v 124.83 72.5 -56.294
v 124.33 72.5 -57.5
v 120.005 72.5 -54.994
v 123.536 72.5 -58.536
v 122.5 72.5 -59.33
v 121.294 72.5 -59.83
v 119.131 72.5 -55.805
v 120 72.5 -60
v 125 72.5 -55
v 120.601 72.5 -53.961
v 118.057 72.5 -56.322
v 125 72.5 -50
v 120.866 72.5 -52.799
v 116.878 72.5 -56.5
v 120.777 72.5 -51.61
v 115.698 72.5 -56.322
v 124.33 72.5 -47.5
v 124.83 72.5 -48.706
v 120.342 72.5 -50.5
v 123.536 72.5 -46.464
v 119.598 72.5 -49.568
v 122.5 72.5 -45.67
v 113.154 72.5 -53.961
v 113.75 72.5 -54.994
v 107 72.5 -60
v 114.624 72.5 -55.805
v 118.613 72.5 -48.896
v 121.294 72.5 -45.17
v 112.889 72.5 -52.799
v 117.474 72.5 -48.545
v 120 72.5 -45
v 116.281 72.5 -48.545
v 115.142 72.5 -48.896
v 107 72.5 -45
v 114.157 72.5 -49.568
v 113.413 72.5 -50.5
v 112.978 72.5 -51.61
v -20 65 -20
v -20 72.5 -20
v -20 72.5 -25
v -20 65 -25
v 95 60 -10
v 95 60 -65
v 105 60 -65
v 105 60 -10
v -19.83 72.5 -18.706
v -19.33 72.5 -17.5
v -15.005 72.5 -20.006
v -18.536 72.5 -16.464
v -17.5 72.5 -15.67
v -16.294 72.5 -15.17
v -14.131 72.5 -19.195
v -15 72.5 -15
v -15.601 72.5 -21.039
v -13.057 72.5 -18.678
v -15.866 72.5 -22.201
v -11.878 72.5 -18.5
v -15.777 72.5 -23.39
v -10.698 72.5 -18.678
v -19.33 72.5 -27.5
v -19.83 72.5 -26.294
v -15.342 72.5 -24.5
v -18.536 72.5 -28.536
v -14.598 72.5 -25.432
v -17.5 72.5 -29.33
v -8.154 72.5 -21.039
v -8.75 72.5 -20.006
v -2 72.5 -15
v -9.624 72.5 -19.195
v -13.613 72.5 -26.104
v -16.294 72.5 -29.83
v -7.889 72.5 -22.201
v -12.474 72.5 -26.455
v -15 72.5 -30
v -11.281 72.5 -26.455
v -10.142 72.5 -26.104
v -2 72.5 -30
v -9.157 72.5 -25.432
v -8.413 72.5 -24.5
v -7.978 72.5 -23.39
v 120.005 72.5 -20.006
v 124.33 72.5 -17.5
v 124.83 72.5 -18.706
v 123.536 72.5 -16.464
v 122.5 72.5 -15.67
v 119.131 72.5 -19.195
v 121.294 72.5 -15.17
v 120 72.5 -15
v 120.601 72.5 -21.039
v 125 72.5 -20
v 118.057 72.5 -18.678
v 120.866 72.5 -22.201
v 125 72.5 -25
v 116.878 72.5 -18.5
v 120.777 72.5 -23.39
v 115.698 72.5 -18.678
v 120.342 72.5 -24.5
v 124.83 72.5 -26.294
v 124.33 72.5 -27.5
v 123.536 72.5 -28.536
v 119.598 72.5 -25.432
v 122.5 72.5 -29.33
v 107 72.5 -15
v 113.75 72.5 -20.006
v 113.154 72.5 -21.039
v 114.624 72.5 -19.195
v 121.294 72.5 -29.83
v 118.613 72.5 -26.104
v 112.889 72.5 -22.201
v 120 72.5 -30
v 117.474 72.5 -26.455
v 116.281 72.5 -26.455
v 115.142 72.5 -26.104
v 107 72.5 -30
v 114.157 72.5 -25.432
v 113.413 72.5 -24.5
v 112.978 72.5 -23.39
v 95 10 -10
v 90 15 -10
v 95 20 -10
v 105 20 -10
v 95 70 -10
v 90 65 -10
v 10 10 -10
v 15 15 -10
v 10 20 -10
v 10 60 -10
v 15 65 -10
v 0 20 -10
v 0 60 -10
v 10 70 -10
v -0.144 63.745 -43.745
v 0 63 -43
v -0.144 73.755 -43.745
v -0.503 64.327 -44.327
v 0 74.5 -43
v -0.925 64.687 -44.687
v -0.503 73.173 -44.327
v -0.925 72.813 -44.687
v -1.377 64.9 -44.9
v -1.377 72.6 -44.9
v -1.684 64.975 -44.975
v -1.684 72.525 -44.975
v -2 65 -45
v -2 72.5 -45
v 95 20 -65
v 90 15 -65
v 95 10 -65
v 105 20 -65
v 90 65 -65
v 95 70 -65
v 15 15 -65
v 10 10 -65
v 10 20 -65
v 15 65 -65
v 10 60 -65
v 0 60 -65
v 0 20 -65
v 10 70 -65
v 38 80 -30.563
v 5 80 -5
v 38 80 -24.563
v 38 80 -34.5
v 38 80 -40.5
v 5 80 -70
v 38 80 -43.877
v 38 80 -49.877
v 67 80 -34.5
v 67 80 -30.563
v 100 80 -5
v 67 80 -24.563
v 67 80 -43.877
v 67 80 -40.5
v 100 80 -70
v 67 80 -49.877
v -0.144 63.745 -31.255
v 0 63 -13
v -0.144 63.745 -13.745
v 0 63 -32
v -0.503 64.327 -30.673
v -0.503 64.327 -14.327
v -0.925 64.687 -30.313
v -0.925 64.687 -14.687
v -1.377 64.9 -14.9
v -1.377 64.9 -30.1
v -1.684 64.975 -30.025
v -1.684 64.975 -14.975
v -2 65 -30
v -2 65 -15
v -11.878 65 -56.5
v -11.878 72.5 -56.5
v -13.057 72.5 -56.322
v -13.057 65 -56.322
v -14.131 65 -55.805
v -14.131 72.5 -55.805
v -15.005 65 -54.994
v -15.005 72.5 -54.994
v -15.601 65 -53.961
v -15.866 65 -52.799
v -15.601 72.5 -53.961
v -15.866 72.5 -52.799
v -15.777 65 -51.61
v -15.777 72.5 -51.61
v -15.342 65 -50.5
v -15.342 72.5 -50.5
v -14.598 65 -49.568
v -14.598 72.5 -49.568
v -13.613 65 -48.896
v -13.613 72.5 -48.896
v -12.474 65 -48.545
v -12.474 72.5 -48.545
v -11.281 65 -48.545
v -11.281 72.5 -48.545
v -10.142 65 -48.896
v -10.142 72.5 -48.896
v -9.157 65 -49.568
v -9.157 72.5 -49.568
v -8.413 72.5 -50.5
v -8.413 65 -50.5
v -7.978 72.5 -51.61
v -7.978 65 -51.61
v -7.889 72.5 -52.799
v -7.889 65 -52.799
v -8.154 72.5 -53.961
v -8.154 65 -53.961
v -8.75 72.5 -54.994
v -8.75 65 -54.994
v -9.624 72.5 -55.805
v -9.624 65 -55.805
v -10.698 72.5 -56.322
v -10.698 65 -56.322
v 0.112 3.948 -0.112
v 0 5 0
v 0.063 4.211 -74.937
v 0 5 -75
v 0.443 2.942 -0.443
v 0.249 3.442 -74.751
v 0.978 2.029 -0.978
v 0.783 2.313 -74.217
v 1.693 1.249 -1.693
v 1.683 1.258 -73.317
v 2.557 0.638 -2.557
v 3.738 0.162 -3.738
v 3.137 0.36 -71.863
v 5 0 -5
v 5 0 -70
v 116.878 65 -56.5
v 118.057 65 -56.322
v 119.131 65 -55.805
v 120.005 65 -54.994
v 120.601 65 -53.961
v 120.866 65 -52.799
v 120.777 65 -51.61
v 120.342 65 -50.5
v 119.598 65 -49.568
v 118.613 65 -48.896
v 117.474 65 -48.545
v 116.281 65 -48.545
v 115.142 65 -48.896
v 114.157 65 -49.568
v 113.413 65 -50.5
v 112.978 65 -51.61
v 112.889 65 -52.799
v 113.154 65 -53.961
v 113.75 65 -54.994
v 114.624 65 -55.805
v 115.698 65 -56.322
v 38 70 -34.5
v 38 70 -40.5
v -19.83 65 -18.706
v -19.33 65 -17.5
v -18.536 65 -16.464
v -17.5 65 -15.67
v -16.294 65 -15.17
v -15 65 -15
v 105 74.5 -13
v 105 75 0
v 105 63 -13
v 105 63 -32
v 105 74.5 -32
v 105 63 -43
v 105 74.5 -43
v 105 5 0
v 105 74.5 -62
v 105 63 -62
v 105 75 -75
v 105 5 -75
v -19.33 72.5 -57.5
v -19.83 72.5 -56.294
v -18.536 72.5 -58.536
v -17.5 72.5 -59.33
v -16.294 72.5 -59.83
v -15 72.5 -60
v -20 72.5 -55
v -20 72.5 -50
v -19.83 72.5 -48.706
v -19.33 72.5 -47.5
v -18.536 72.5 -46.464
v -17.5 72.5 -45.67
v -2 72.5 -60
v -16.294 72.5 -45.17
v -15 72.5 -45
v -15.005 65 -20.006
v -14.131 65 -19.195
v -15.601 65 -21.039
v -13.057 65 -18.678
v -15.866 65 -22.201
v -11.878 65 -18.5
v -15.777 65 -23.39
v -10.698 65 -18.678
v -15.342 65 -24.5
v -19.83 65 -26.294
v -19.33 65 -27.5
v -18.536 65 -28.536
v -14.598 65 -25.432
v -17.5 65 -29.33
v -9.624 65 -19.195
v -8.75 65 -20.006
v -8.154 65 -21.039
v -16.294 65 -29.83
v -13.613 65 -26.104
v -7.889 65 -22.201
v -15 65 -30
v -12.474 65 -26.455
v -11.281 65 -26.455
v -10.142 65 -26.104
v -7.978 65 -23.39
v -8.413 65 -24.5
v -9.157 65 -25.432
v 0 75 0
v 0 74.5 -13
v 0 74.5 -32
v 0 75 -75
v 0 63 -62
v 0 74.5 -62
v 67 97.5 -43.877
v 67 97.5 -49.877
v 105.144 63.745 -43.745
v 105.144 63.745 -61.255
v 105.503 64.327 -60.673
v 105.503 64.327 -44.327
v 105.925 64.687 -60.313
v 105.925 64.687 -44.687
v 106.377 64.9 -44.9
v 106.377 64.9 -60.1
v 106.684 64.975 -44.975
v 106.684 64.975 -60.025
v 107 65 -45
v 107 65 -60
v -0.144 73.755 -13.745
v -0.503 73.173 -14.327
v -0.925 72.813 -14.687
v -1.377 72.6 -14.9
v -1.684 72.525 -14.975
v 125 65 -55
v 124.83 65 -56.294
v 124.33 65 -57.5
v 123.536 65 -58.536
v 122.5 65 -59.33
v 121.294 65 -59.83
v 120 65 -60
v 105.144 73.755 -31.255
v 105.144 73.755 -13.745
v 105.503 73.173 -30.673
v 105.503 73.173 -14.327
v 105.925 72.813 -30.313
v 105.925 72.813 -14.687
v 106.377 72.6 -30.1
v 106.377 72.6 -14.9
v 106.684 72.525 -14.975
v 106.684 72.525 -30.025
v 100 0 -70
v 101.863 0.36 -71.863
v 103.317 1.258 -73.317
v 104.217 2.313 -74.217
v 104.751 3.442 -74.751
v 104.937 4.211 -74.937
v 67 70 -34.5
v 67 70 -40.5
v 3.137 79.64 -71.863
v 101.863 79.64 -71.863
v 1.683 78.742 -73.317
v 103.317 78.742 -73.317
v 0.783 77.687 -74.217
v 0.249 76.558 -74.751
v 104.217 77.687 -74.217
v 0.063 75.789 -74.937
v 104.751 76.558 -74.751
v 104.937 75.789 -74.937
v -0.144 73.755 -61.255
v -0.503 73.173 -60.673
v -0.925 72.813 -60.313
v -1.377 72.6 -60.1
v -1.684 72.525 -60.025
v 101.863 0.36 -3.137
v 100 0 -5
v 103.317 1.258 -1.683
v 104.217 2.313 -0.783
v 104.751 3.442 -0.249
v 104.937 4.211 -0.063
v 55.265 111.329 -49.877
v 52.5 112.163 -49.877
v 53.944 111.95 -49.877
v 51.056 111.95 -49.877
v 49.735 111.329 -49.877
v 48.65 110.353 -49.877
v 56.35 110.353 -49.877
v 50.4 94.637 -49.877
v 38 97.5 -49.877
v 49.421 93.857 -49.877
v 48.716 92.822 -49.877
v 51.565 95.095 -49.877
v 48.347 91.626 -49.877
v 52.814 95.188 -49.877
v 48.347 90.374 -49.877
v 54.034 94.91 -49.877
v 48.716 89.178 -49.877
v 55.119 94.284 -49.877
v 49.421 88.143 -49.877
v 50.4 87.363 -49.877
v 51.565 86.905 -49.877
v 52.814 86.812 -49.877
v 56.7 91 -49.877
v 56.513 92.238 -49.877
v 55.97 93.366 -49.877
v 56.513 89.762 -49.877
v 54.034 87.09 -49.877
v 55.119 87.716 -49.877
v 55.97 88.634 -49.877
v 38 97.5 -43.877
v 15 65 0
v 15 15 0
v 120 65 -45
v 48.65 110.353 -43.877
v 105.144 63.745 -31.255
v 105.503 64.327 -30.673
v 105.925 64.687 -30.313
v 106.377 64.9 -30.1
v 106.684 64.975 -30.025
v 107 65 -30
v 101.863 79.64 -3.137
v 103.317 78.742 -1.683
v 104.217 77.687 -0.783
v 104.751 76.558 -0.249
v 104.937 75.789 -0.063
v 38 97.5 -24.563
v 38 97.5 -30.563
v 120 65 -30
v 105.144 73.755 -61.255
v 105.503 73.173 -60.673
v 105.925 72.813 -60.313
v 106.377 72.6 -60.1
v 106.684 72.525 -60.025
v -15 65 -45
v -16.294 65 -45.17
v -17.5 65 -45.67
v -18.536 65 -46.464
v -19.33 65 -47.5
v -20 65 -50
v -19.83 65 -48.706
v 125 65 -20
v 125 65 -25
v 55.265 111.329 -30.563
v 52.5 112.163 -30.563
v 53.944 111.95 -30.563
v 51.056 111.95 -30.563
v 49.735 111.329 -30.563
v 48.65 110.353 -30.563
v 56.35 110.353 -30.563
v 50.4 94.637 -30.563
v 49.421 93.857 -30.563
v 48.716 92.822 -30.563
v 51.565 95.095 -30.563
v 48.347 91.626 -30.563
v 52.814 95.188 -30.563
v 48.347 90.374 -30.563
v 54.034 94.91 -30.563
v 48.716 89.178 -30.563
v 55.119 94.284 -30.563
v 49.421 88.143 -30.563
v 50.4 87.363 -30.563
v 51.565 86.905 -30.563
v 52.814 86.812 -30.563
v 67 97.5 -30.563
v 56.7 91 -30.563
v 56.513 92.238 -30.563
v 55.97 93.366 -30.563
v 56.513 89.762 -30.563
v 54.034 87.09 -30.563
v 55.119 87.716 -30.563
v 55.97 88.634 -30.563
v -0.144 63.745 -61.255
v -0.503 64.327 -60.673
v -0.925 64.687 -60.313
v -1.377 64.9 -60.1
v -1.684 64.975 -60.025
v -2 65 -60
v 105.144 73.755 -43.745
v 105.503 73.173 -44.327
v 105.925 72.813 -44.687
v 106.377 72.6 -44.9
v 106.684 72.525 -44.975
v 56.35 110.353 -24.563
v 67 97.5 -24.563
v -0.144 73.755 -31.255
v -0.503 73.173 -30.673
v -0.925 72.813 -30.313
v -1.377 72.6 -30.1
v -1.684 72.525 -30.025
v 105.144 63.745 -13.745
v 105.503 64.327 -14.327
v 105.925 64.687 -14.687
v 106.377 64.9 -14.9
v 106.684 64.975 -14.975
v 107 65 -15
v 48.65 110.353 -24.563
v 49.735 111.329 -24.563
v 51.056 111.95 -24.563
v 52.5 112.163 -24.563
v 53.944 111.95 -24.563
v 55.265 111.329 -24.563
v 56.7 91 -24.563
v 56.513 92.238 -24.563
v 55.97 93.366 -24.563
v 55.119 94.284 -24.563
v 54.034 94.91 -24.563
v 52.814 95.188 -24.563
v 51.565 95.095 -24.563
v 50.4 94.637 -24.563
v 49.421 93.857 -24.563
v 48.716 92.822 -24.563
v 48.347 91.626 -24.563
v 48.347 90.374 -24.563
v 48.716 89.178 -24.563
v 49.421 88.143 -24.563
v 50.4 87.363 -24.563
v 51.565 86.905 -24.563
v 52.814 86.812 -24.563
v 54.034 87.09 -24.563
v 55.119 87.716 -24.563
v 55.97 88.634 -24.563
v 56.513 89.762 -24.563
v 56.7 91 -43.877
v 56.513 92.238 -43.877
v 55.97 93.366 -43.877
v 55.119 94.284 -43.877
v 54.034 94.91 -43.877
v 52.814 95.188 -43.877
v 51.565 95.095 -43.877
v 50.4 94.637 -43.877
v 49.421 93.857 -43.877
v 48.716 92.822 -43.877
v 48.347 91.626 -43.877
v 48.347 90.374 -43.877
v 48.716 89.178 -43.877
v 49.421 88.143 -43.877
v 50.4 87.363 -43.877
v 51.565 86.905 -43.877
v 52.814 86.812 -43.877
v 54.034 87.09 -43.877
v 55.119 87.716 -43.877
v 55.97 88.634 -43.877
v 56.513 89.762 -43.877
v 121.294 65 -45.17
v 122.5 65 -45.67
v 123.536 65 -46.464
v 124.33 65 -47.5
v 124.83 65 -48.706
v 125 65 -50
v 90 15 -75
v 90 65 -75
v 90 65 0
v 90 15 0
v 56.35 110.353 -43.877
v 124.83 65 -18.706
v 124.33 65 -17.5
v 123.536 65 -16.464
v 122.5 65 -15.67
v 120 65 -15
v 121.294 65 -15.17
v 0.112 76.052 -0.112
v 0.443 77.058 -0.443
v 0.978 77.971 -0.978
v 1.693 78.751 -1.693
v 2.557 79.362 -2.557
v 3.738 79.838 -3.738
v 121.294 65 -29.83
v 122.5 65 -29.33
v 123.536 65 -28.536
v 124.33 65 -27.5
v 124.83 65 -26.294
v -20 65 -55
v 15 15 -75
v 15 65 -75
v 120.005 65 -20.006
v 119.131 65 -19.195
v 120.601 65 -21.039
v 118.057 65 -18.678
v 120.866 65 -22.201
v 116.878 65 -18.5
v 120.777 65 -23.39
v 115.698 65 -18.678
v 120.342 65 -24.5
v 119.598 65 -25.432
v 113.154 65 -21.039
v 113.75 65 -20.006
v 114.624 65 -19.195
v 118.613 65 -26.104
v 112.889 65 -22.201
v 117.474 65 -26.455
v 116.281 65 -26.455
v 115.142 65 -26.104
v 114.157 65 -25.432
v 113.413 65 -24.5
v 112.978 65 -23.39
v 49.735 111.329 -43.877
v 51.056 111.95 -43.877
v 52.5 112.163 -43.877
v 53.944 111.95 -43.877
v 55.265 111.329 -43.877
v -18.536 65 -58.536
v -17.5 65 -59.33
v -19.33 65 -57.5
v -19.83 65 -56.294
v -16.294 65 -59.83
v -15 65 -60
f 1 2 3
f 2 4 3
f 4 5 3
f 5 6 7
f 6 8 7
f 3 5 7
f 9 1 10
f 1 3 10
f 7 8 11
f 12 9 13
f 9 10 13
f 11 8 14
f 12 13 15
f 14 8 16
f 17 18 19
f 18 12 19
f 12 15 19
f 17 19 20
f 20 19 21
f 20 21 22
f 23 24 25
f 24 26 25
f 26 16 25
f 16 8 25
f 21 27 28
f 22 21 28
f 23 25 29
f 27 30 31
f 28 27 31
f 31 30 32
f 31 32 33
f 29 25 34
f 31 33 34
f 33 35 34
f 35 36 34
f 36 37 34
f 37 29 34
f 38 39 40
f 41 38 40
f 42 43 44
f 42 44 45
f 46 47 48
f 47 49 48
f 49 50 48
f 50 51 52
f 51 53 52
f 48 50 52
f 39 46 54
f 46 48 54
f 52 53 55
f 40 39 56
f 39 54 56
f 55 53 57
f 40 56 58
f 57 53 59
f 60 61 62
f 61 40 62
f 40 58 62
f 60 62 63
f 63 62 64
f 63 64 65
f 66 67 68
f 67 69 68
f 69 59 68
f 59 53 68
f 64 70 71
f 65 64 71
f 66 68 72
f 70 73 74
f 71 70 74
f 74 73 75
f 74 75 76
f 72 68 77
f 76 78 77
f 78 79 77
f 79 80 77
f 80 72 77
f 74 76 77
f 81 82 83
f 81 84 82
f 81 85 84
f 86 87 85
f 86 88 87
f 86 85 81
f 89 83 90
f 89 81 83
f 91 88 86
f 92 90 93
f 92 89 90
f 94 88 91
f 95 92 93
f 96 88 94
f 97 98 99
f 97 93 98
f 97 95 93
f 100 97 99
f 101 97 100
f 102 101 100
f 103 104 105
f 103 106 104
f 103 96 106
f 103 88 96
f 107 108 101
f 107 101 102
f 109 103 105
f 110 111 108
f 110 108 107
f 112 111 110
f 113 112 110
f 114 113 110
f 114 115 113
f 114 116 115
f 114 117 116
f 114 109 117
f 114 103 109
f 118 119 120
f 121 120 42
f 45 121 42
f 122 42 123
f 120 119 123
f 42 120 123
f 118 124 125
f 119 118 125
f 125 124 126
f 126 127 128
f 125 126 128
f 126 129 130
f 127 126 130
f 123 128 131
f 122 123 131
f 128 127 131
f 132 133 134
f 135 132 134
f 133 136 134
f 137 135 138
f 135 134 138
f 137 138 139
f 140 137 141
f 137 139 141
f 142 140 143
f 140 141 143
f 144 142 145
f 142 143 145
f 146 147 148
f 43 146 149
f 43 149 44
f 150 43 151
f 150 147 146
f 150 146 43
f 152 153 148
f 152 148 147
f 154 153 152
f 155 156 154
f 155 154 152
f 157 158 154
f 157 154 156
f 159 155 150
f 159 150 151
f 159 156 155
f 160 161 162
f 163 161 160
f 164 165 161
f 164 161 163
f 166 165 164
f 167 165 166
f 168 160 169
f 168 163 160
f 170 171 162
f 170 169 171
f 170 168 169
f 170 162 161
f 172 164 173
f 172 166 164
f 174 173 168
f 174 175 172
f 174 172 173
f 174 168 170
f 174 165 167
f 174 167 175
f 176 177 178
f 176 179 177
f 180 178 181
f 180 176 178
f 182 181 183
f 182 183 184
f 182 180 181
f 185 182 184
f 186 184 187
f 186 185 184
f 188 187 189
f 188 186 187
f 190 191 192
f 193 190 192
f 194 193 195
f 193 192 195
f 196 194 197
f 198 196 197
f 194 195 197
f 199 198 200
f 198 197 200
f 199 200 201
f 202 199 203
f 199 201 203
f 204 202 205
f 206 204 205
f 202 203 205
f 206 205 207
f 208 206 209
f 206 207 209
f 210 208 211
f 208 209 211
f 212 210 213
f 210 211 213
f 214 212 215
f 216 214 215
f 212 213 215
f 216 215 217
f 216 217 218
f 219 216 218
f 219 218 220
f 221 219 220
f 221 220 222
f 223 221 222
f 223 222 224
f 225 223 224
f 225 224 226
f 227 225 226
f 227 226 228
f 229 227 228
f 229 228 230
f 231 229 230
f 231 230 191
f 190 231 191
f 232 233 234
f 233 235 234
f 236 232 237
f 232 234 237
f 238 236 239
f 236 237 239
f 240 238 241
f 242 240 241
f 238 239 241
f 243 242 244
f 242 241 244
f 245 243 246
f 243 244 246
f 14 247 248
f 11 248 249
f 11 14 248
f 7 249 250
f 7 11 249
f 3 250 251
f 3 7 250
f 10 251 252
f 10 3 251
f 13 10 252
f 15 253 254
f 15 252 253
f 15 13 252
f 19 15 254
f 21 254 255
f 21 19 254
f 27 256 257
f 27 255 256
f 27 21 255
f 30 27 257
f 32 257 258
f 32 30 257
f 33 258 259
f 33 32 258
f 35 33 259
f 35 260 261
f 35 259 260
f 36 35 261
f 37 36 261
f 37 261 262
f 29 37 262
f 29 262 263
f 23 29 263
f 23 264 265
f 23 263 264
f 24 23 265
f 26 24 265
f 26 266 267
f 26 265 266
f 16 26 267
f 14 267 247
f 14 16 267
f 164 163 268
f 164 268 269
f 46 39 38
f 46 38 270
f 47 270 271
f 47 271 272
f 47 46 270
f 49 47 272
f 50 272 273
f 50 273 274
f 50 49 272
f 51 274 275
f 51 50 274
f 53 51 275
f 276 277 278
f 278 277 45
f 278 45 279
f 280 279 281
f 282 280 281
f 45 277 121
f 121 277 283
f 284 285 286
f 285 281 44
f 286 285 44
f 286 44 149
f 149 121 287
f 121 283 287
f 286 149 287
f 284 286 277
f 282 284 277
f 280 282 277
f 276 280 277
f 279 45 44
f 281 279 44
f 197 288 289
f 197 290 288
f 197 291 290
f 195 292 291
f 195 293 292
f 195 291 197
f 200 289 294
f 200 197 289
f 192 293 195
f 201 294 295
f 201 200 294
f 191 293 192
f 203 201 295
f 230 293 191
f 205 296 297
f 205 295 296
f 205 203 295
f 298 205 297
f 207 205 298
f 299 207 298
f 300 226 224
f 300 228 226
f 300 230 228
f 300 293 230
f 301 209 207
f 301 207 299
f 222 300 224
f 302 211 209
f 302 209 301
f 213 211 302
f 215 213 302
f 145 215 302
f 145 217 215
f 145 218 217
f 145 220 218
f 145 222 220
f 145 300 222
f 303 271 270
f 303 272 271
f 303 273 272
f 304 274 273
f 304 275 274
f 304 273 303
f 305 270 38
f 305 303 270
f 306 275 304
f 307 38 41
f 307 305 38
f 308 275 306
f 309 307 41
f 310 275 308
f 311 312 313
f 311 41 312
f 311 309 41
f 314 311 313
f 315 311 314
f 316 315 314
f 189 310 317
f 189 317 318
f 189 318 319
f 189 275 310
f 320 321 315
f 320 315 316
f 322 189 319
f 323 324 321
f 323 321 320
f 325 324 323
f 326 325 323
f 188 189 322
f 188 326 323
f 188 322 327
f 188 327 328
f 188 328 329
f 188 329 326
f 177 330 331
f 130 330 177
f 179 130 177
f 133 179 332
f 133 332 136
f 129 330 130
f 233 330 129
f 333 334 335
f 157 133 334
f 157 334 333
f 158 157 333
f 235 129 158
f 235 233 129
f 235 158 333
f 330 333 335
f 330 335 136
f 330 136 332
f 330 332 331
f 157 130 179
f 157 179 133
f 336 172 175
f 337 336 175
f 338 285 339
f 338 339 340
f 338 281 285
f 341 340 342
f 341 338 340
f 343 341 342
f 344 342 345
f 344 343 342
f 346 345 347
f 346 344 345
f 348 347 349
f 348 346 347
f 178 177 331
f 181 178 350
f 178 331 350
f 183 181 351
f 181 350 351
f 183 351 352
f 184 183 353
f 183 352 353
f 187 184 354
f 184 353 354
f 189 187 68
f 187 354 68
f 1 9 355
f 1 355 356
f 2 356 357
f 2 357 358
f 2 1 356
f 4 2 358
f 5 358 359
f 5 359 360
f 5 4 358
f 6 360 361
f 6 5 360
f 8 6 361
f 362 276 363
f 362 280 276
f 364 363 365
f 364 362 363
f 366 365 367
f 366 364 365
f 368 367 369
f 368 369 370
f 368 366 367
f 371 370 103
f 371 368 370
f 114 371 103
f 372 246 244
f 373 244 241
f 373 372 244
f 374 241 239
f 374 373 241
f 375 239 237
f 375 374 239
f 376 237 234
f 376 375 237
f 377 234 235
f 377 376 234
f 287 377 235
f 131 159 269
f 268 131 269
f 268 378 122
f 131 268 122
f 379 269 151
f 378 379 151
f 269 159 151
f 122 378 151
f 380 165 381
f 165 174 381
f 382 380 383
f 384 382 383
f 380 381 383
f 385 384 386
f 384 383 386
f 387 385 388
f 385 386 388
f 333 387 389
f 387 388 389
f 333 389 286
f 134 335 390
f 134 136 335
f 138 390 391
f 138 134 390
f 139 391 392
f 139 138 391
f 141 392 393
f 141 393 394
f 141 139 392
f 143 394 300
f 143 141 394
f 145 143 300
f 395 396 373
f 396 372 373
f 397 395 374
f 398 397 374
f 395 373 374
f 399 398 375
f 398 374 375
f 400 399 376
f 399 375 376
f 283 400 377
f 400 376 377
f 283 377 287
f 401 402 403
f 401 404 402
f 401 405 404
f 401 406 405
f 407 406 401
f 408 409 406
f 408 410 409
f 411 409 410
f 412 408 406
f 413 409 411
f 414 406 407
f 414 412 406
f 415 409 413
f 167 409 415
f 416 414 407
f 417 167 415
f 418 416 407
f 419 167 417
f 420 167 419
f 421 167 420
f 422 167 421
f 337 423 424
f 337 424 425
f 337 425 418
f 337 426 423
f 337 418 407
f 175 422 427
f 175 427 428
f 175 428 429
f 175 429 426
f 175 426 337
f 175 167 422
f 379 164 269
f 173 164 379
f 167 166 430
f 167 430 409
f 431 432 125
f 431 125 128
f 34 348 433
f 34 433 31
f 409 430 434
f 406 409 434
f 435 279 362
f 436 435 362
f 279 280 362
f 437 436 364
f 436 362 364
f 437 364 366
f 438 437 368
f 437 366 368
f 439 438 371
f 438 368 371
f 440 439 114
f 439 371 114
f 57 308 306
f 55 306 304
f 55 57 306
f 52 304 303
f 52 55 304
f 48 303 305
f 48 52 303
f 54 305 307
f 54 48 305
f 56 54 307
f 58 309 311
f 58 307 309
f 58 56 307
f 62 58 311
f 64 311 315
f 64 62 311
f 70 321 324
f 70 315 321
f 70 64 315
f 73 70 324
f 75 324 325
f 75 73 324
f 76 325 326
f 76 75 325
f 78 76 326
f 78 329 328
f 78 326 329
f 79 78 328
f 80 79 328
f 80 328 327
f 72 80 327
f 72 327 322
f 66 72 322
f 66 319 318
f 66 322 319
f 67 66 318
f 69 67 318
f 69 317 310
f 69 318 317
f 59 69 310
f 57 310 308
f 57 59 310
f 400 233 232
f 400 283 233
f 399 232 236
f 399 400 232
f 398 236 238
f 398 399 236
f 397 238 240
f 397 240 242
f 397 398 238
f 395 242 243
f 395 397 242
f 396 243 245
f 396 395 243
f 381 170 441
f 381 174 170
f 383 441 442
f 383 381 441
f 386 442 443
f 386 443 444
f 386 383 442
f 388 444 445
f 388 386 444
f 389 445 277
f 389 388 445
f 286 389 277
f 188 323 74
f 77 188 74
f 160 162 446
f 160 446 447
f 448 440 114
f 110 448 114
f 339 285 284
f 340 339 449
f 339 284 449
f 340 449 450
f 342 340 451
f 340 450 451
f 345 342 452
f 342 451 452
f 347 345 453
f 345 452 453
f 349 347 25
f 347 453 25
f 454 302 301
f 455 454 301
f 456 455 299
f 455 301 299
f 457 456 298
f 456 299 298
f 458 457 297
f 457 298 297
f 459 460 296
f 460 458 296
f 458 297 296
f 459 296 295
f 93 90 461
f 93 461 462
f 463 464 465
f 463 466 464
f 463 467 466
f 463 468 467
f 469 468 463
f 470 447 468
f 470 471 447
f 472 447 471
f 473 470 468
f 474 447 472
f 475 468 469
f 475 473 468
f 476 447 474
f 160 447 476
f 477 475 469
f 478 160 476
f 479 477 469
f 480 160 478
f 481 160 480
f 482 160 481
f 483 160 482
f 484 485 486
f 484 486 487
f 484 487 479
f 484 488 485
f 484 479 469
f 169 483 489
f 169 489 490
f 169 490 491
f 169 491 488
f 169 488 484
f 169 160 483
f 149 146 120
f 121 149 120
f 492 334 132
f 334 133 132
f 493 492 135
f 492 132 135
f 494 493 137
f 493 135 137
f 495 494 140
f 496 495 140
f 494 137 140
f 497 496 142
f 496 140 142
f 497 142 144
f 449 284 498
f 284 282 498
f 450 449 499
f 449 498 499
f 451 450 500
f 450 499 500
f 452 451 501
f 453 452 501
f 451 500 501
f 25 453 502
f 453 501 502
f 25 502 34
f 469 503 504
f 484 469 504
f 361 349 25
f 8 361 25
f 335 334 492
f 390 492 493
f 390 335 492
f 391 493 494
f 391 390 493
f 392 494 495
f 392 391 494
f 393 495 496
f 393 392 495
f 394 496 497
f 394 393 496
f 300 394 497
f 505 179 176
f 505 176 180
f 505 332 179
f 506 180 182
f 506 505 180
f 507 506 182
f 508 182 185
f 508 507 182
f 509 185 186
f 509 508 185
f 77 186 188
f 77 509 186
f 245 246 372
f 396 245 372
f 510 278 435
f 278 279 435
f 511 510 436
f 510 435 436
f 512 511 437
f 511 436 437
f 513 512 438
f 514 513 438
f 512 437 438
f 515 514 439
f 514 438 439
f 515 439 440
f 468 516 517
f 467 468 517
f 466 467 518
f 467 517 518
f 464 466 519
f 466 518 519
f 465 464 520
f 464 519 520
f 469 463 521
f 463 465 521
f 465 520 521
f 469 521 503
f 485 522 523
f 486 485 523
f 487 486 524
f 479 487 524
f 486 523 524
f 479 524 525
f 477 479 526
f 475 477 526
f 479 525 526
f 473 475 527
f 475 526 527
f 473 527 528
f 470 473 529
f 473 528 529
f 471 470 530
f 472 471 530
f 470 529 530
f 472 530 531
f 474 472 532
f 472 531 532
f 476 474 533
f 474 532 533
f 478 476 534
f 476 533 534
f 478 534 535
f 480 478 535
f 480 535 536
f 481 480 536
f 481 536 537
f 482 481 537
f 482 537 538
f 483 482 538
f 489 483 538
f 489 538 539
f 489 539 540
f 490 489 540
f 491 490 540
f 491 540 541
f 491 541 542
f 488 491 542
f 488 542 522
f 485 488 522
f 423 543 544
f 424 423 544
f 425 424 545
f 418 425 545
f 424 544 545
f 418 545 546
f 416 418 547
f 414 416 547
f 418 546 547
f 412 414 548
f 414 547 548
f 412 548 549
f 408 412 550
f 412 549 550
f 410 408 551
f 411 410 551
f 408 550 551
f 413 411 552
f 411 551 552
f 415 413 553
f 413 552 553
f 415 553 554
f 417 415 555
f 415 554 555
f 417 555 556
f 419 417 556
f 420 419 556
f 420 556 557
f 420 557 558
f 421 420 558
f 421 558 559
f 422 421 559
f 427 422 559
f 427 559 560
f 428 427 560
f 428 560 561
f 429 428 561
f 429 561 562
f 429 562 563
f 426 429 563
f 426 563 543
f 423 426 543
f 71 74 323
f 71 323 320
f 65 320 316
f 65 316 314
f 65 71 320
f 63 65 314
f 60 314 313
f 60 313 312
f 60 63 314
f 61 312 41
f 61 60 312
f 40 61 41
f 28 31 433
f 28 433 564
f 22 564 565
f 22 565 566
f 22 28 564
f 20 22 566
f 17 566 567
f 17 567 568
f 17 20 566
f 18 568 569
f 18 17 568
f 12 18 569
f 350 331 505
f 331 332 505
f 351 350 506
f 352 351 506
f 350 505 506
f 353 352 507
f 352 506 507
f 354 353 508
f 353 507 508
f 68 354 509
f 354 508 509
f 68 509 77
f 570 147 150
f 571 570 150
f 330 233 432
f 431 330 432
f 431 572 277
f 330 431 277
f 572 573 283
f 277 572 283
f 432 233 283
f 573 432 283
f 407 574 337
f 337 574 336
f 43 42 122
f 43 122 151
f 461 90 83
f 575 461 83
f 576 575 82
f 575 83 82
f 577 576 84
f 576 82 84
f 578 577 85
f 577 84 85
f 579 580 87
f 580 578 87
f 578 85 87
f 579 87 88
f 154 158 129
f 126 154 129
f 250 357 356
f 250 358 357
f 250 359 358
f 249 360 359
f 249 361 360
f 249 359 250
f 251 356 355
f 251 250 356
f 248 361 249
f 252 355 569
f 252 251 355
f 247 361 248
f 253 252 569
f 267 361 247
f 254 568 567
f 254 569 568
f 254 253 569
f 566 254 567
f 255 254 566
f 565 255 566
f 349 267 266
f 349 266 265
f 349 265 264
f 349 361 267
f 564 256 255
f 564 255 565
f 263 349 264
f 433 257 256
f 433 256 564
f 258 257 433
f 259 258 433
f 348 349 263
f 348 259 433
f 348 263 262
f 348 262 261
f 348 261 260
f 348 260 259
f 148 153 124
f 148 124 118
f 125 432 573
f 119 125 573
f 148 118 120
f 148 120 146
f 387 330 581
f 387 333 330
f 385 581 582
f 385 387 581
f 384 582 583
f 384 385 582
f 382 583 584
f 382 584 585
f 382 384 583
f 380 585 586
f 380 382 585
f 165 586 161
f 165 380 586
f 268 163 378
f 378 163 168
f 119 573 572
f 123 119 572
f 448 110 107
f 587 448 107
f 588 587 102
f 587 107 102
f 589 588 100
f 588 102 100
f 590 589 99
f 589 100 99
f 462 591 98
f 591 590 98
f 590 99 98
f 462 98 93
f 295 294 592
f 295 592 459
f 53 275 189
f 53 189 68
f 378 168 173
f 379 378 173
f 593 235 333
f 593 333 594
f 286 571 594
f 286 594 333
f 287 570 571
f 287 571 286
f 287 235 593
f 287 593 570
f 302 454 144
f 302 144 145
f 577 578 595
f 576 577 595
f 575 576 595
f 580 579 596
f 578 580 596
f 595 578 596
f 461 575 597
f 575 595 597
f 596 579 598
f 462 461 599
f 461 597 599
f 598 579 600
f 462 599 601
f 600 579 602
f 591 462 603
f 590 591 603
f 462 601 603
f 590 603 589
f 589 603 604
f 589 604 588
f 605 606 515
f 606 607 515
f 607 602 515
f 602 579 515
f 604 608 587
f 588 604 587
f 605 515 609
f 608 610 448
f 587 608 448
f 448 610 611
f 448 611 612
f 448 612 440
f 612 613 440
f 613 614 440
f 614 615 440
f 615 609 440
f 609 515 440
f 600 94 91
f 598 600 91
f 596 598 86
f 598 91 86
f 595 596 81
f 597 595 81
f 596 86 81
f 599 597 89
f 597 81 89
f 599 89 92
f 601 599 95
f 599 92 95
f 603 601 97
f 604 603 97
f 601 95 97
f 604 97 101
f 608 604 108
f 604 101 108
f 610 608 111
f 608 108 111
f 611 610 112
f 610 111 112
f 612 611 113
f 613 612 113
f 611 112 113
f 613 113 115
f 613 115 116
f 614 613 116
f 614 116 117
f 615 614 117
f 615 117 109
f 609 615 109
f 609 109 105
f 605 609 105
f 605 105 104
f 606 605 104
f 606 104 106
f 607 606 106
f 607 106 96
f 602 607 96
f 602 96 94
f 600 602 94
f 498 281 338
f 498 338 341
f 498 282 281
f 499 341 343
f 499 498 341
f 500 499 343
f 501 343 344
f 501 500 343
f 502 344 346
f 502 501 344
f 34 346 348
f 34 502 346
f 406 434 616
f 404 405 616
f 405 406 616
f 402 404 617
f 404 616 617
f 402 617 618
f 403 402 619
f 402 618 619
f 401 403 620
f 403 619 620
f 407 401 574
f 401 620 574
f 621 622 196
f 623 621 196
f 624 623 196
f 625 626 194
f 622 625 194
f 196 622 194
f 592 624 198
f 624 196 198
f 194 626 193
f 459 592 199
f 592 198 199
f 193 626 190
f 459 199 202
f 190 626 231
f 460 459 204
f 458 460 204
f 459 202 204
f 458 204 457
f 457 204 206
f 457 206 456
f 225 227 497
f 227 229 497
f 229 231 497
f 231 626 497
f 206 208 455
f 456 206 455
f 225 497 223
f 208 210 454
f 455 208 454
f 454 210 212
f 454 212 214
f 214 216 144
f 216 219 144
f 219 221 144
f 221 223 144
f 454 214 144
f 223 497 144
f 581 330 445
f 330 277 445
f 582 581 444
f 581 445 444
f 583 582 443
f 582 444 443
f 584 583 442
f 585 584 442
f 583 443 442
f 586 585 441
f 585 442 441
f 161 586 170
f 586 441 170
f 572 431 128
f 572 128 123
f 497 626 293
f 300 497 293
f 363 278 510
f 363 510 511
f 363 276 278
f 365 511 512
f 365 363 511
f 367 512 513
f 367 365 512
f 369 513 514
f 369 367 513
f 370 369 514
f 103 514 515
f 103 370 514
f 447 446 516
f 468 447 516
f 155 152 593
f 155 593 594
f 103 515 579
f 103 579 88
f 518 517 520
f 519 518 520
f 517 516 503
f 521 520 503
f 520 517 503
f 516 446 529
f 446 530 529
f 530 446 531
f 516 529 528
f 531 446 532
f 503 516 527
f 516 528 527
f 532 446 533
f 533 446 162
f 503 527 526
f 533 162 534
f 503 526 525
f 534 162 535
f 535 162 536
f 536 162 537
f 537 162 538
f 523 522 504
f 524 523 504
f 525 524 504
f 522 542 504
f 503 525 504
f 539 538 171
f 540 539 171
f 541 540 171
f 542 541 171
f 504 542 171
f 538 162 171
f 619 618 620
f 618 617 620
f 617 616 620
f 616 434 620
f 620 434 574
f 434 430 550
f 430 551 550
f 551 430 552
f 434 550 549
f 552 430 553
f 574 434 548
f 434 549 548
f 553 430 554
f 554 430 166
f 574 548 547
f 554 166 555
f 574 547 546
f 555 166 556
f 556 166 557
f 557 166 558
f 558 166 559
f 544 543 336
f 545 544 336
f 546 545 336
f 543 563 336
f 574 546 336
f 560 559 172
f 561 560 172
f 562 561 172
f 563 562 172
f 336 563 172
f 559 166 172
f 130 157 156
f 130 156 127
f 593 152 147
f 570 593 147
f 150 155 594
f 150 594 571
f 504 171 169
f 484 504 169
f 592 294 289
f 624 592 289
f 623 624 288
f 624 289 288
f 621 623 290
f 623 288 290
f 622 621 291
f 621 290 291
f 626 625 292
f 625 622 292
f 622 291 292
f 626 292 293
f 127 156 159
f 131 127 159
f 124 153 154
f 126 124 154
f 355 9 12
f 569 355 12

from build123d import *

# Parameters (mm, degrees)
SKETCH1_W               = 105
SKETCH1_H               = 75
BOSS_EXTRUDE1_DEPTH     = 80
SHELL1_T                = -10
SKETCH2_W               = 10
SKETCH2_H               = 60
BOSS_EXTRUDE2_DEPTH     = 60
FILLET1_R               = 5
SKETCH3_W               = 75
SKETCH3_H               = 50
CUT_EXTRUDE1_DEPTH      = 152.822264507
SKETCH4_W               = 55
SKETCH4_H               = 40
CUT_EXTRUDE2_DEPTH      = 152.822264507
SKETCH5_W               = 15
SKETCH5_H               = 7.5
BOSS_EXTRUDE3_DEPTH     = 20
SKETCH6_R               = 4
CUT_EXTRUDE3_DEPTH      = 163.807401552
MIRROR2_COPY_1_SKETCH_W = 15
MIRROR2_COPY_1_SKETCH_H = 7.5
MIRROR2_COPY_1_DEPTH    = 20
MIRROR2_COPY_2_SKETCH_R = 4
MIRROR2_COPY_2_DEPTH    = 163.807401552
FILLET3_R               = 2
SKETCH7_W               = 29
SKETCH7_H               = 6
CUT_EXTRUDE4_DEPTH      = 15
SKETCH8_W               = 29
SKETCH8_H               = 6
BOSS_EXTRUDE4_DEPTH     = 35
SKETCH9_R               = 4.2
CUT_EXTRUDE5_DEPTH      = 35


with BuildPart() as part:
    # Sketch1 → Boss-Extrude1 (new body)
    with BuildSketch(Plane(origin=(0, 0, 0), x_dir=(1, 0, 0), z_dir=(0, 1, 0))):
        with Locations((52.5, 37.5)):
            Rectangle(SKETCH1_W, SKETCH1_H)
    extrude(amount=BOSS_EXTRUDE1_DEPTH)

    # Shell1
    shell1_openings = [part.faces().sort_by_distance(p)[0] for p in [
        (0, 40, -37.5),
    ]]
    offset(amount=SHELL1_T, openings=shell1_openings, kind=Kind.INTERSECTION)

    # Sketch2 → Boss-Extrude2 (add)
    with BuildSketch(Plane.XY.offset(-65)):
        with Locations((5, 40)):
            Rectangle(SKETCH2_W, SKETCH2_H)
    extrude(amount=BOSS_EXTRUDE2_DEPTH)

    # Fillet1
    fillet1_edges = [part.edges().sort_by_distance(p)[0] for p in [
        (105, 80, -37.5),
        (52.5, 80, -75),
        (0, 80, -37.5),
        (52.5, 0, -75),
        (105, 0, -37.5),
        (52.5, 0, 0),
        (0, 0, -37.5),
        (52.5, 80, 0),
    ]]
    fillet(fillet1_edges, radius=FILLET1_R)

    # Sketch3 → Cut-Extrude1 (cut, through all)
    with BuildSketch(Plane.XY):
        with Locations((52.5, 40)):
            Rectangle(SKETCH3_W, SKETCH3_H)
    extrude(amount=-CUT_EXTRUDE1_DEPTH, mode=Mode.SUBTRACT)

    # Sketch4 → Cut-Extrude2 (cut, through all)
    with BuildSketch(Plane.ZY):
        with Locations((-37.5, 40)):
            Rectangle(SKETCH4_W, SKETCH4_H)
    extrude(amount=-CUT_EXTRUDE2_DEPTH, mode=Mode.SUBTRACT)

    # Sketch5 → Boss-Extrude3 (add)
    with BuildSketch(Plane(origin=(105, 0, 0), x_dir=(0, 0, -1), z_dir=(1, 0, 0))):
        with Locations((22.5, 68.75)):
            Rectangle(SKETCH5_W, SKETCH5_H)
    boss_extrude3 = extrude(amount=BOSS_EXTRUDE3_DEPTH)

    # Sketch6 → Cut-Extrude3 (cut, through all)
    with BuildSketch(Plane(origin=(0, 72.5, 0), x_dir=(1, 0, 0), z_dir=(0, 1, 0))):
        with BuildLine():
            Line((125, 30), (120, 30))
            ThreePointArc((120, 30), (123.535533906, 28.535533906), (125, 25))
            Line((125, 25), (125, 30))
        make_face()
        with Locations(Location((116.877501001, 22.5, 0), (0, 0, 270))):
            Circle(SKETCH6_R)
        with BuildLine():
            ThreePointArc((125, 20), (123.535533906, 16.464466094), (120, 15))
            Line((120, 15), (125, 15))
            Line((125, 15), (125, 20))
        make_face()
    cut_extrude3 = extrude(amount=-CUT_EXTRUDE3_DEPTH, mode=Mode.SUBTRACT)

    # Mirror1: Boss-Extrude3, Cut-Extrude3 across plane
    add(boss_extrude3.mirror(Plane(origin=(52.5, 0, 0), x_dir=(0, 0, 1), z_dir=(1, 0, 0))))
    add(cut_extrude3.mirror(Plane(origin=(52.5, 0, 0), x_dir=(0, 0, 1), z_dir=(1, 0, 0))), mode=Mode.SUBTRACT)

    # Mirror2: Boss-Extrude3, Cut-Extrude3 across plane
    add(boss_extrude3.mirror(Plane.XY.offset(-37.5)))
    add(cut_extrude3.mirror(Plane.XY.offset(-37.5)), mode=Mode.SUBTRACT)

    # Mirror2 copy 1 sketch → Mirror2 copy 1 (add)
    with BuildSketch(Plane(origin=(0, 0, -75), x_dir=(0, 0, 1), z_dir=(-1, 0, 0))):
        with Locations((22.5, 68.75)):
            Rectangle(MIRROR2_COPY_1_SKETCH_W, MIRROR2_COPY_1_SKETCH_H)
    extrude(amount=MIRROR2_COPY_1_DEPTH)

    # Mirror2 copy 2 sketch → Mirror2 copy 2 (cut, through all)
    with BuildSketch(Plane(origin=(105, 72.5, -75), x_dir=(-1, 0, 0), z_dir=(0, 1, 0))):
        with BuildLine():
            Line((125, 30), (120, 30))
            ThreePointArc((120, 30), (123.535533906, 28.535533906), (125, 25))
            Line((125, 25), (125, 30))
        make_face()
        with Locations(Location((116.877501001, 22.5, 0), (0, 0, 270))):
            Circle(MIRROR2_COPY_2_SKETCH_R)
        with BuildLine():
            ThreePointArc((125, 20), (123.535533906, 16.464466094), (120, 15))
            Line((120, 15), (125, 15))
            Line((125, 15), (125, 20))
        make_face()
    extrude(amount=-MIRROR2_COPY_2_DEPTH, mode=Mode.SUBTRACT)

    # Fillet3
    fillet3_edges = [part.edges().sort_by_distance(p)[0] for p in [
        (105, 68.75, -15),
        (105, 65, -22.5),
        (105, 68.75, -30),
        (105, 72.5, -22.5),
        (0, 68.75, -15),
        (0, 65, -22.5),
        (0, 68.75, -30),
        (0, 72.5, -22.5),
        (0, 68.75, -60),
        (0, 65, -52.5),
        (0, 68.75, -45),
        (0, 72.5, -52.5),
        (105, 68.75, -60),
        (105, 65, -52.5),
        (105, 68.75, -45),
        (105, 72.5, -52.5),
    ]]
    fillet(fillet3_edges, radius=FILLET3_R)

    # Sketch7 → Cut-Extrude4 (cut)
    with BuildSketch(Plane(origin=(0, 80, 0), x_dir=(1, 0, 0), z_dir=(0, 1, 0))):
        with Locations((52.5, 37.5)):
            Rectangle(SKETCH7_W, SKETCH7_H)
    extrude(amount=-CUT_EXTRUDE4_DEPTH, mode=Mode.SUBTRACT)

    # Sketch8 → Boss-Extrude4 (add)
    with BuildSketch(Plane(origin=(0, 80, 0), x_dir=(1, 0, 0), z_dir=(0, 1, 0))):
        with Locations((52.5, 46.877224158)):
            Rectangle(SKETCH8_W, SKETCH8_H)
        with Locations((52.5, 27.56334528)):
            Rectangle(SKETCH8_W, SKETCH8_H)
    extrude(amount=BOSS_EXTRUDE4_DEPTH)

    # Sketch9 → Cut-Extrude5 (cut)
    with BuildSketch(Plane.XY.offset(-24.56334528)):
        with BuildLine():
            Line((38, 115), (38, 97.5))
            Line((38, 97.5), (48.649892195, 110.353318167))
            ThreePointArc((48.649892195, 110.353318167), (52.5, 112.163228843), (56.350107805, 110.353318167))
            Line((56.350107805, 110.353318167), (67, 97.5))
            Line((67, 97.5), (67, 115))
            Line((67, 115), (38, 115))
        make_face()
        with Locations((52.5, 91)):
            Circle(SKETCH9_R)
    extrude(amount=-CUT_EXTRUDE5_DEPTH, mode=Mode.SUBTRACT)


solid = part.part
